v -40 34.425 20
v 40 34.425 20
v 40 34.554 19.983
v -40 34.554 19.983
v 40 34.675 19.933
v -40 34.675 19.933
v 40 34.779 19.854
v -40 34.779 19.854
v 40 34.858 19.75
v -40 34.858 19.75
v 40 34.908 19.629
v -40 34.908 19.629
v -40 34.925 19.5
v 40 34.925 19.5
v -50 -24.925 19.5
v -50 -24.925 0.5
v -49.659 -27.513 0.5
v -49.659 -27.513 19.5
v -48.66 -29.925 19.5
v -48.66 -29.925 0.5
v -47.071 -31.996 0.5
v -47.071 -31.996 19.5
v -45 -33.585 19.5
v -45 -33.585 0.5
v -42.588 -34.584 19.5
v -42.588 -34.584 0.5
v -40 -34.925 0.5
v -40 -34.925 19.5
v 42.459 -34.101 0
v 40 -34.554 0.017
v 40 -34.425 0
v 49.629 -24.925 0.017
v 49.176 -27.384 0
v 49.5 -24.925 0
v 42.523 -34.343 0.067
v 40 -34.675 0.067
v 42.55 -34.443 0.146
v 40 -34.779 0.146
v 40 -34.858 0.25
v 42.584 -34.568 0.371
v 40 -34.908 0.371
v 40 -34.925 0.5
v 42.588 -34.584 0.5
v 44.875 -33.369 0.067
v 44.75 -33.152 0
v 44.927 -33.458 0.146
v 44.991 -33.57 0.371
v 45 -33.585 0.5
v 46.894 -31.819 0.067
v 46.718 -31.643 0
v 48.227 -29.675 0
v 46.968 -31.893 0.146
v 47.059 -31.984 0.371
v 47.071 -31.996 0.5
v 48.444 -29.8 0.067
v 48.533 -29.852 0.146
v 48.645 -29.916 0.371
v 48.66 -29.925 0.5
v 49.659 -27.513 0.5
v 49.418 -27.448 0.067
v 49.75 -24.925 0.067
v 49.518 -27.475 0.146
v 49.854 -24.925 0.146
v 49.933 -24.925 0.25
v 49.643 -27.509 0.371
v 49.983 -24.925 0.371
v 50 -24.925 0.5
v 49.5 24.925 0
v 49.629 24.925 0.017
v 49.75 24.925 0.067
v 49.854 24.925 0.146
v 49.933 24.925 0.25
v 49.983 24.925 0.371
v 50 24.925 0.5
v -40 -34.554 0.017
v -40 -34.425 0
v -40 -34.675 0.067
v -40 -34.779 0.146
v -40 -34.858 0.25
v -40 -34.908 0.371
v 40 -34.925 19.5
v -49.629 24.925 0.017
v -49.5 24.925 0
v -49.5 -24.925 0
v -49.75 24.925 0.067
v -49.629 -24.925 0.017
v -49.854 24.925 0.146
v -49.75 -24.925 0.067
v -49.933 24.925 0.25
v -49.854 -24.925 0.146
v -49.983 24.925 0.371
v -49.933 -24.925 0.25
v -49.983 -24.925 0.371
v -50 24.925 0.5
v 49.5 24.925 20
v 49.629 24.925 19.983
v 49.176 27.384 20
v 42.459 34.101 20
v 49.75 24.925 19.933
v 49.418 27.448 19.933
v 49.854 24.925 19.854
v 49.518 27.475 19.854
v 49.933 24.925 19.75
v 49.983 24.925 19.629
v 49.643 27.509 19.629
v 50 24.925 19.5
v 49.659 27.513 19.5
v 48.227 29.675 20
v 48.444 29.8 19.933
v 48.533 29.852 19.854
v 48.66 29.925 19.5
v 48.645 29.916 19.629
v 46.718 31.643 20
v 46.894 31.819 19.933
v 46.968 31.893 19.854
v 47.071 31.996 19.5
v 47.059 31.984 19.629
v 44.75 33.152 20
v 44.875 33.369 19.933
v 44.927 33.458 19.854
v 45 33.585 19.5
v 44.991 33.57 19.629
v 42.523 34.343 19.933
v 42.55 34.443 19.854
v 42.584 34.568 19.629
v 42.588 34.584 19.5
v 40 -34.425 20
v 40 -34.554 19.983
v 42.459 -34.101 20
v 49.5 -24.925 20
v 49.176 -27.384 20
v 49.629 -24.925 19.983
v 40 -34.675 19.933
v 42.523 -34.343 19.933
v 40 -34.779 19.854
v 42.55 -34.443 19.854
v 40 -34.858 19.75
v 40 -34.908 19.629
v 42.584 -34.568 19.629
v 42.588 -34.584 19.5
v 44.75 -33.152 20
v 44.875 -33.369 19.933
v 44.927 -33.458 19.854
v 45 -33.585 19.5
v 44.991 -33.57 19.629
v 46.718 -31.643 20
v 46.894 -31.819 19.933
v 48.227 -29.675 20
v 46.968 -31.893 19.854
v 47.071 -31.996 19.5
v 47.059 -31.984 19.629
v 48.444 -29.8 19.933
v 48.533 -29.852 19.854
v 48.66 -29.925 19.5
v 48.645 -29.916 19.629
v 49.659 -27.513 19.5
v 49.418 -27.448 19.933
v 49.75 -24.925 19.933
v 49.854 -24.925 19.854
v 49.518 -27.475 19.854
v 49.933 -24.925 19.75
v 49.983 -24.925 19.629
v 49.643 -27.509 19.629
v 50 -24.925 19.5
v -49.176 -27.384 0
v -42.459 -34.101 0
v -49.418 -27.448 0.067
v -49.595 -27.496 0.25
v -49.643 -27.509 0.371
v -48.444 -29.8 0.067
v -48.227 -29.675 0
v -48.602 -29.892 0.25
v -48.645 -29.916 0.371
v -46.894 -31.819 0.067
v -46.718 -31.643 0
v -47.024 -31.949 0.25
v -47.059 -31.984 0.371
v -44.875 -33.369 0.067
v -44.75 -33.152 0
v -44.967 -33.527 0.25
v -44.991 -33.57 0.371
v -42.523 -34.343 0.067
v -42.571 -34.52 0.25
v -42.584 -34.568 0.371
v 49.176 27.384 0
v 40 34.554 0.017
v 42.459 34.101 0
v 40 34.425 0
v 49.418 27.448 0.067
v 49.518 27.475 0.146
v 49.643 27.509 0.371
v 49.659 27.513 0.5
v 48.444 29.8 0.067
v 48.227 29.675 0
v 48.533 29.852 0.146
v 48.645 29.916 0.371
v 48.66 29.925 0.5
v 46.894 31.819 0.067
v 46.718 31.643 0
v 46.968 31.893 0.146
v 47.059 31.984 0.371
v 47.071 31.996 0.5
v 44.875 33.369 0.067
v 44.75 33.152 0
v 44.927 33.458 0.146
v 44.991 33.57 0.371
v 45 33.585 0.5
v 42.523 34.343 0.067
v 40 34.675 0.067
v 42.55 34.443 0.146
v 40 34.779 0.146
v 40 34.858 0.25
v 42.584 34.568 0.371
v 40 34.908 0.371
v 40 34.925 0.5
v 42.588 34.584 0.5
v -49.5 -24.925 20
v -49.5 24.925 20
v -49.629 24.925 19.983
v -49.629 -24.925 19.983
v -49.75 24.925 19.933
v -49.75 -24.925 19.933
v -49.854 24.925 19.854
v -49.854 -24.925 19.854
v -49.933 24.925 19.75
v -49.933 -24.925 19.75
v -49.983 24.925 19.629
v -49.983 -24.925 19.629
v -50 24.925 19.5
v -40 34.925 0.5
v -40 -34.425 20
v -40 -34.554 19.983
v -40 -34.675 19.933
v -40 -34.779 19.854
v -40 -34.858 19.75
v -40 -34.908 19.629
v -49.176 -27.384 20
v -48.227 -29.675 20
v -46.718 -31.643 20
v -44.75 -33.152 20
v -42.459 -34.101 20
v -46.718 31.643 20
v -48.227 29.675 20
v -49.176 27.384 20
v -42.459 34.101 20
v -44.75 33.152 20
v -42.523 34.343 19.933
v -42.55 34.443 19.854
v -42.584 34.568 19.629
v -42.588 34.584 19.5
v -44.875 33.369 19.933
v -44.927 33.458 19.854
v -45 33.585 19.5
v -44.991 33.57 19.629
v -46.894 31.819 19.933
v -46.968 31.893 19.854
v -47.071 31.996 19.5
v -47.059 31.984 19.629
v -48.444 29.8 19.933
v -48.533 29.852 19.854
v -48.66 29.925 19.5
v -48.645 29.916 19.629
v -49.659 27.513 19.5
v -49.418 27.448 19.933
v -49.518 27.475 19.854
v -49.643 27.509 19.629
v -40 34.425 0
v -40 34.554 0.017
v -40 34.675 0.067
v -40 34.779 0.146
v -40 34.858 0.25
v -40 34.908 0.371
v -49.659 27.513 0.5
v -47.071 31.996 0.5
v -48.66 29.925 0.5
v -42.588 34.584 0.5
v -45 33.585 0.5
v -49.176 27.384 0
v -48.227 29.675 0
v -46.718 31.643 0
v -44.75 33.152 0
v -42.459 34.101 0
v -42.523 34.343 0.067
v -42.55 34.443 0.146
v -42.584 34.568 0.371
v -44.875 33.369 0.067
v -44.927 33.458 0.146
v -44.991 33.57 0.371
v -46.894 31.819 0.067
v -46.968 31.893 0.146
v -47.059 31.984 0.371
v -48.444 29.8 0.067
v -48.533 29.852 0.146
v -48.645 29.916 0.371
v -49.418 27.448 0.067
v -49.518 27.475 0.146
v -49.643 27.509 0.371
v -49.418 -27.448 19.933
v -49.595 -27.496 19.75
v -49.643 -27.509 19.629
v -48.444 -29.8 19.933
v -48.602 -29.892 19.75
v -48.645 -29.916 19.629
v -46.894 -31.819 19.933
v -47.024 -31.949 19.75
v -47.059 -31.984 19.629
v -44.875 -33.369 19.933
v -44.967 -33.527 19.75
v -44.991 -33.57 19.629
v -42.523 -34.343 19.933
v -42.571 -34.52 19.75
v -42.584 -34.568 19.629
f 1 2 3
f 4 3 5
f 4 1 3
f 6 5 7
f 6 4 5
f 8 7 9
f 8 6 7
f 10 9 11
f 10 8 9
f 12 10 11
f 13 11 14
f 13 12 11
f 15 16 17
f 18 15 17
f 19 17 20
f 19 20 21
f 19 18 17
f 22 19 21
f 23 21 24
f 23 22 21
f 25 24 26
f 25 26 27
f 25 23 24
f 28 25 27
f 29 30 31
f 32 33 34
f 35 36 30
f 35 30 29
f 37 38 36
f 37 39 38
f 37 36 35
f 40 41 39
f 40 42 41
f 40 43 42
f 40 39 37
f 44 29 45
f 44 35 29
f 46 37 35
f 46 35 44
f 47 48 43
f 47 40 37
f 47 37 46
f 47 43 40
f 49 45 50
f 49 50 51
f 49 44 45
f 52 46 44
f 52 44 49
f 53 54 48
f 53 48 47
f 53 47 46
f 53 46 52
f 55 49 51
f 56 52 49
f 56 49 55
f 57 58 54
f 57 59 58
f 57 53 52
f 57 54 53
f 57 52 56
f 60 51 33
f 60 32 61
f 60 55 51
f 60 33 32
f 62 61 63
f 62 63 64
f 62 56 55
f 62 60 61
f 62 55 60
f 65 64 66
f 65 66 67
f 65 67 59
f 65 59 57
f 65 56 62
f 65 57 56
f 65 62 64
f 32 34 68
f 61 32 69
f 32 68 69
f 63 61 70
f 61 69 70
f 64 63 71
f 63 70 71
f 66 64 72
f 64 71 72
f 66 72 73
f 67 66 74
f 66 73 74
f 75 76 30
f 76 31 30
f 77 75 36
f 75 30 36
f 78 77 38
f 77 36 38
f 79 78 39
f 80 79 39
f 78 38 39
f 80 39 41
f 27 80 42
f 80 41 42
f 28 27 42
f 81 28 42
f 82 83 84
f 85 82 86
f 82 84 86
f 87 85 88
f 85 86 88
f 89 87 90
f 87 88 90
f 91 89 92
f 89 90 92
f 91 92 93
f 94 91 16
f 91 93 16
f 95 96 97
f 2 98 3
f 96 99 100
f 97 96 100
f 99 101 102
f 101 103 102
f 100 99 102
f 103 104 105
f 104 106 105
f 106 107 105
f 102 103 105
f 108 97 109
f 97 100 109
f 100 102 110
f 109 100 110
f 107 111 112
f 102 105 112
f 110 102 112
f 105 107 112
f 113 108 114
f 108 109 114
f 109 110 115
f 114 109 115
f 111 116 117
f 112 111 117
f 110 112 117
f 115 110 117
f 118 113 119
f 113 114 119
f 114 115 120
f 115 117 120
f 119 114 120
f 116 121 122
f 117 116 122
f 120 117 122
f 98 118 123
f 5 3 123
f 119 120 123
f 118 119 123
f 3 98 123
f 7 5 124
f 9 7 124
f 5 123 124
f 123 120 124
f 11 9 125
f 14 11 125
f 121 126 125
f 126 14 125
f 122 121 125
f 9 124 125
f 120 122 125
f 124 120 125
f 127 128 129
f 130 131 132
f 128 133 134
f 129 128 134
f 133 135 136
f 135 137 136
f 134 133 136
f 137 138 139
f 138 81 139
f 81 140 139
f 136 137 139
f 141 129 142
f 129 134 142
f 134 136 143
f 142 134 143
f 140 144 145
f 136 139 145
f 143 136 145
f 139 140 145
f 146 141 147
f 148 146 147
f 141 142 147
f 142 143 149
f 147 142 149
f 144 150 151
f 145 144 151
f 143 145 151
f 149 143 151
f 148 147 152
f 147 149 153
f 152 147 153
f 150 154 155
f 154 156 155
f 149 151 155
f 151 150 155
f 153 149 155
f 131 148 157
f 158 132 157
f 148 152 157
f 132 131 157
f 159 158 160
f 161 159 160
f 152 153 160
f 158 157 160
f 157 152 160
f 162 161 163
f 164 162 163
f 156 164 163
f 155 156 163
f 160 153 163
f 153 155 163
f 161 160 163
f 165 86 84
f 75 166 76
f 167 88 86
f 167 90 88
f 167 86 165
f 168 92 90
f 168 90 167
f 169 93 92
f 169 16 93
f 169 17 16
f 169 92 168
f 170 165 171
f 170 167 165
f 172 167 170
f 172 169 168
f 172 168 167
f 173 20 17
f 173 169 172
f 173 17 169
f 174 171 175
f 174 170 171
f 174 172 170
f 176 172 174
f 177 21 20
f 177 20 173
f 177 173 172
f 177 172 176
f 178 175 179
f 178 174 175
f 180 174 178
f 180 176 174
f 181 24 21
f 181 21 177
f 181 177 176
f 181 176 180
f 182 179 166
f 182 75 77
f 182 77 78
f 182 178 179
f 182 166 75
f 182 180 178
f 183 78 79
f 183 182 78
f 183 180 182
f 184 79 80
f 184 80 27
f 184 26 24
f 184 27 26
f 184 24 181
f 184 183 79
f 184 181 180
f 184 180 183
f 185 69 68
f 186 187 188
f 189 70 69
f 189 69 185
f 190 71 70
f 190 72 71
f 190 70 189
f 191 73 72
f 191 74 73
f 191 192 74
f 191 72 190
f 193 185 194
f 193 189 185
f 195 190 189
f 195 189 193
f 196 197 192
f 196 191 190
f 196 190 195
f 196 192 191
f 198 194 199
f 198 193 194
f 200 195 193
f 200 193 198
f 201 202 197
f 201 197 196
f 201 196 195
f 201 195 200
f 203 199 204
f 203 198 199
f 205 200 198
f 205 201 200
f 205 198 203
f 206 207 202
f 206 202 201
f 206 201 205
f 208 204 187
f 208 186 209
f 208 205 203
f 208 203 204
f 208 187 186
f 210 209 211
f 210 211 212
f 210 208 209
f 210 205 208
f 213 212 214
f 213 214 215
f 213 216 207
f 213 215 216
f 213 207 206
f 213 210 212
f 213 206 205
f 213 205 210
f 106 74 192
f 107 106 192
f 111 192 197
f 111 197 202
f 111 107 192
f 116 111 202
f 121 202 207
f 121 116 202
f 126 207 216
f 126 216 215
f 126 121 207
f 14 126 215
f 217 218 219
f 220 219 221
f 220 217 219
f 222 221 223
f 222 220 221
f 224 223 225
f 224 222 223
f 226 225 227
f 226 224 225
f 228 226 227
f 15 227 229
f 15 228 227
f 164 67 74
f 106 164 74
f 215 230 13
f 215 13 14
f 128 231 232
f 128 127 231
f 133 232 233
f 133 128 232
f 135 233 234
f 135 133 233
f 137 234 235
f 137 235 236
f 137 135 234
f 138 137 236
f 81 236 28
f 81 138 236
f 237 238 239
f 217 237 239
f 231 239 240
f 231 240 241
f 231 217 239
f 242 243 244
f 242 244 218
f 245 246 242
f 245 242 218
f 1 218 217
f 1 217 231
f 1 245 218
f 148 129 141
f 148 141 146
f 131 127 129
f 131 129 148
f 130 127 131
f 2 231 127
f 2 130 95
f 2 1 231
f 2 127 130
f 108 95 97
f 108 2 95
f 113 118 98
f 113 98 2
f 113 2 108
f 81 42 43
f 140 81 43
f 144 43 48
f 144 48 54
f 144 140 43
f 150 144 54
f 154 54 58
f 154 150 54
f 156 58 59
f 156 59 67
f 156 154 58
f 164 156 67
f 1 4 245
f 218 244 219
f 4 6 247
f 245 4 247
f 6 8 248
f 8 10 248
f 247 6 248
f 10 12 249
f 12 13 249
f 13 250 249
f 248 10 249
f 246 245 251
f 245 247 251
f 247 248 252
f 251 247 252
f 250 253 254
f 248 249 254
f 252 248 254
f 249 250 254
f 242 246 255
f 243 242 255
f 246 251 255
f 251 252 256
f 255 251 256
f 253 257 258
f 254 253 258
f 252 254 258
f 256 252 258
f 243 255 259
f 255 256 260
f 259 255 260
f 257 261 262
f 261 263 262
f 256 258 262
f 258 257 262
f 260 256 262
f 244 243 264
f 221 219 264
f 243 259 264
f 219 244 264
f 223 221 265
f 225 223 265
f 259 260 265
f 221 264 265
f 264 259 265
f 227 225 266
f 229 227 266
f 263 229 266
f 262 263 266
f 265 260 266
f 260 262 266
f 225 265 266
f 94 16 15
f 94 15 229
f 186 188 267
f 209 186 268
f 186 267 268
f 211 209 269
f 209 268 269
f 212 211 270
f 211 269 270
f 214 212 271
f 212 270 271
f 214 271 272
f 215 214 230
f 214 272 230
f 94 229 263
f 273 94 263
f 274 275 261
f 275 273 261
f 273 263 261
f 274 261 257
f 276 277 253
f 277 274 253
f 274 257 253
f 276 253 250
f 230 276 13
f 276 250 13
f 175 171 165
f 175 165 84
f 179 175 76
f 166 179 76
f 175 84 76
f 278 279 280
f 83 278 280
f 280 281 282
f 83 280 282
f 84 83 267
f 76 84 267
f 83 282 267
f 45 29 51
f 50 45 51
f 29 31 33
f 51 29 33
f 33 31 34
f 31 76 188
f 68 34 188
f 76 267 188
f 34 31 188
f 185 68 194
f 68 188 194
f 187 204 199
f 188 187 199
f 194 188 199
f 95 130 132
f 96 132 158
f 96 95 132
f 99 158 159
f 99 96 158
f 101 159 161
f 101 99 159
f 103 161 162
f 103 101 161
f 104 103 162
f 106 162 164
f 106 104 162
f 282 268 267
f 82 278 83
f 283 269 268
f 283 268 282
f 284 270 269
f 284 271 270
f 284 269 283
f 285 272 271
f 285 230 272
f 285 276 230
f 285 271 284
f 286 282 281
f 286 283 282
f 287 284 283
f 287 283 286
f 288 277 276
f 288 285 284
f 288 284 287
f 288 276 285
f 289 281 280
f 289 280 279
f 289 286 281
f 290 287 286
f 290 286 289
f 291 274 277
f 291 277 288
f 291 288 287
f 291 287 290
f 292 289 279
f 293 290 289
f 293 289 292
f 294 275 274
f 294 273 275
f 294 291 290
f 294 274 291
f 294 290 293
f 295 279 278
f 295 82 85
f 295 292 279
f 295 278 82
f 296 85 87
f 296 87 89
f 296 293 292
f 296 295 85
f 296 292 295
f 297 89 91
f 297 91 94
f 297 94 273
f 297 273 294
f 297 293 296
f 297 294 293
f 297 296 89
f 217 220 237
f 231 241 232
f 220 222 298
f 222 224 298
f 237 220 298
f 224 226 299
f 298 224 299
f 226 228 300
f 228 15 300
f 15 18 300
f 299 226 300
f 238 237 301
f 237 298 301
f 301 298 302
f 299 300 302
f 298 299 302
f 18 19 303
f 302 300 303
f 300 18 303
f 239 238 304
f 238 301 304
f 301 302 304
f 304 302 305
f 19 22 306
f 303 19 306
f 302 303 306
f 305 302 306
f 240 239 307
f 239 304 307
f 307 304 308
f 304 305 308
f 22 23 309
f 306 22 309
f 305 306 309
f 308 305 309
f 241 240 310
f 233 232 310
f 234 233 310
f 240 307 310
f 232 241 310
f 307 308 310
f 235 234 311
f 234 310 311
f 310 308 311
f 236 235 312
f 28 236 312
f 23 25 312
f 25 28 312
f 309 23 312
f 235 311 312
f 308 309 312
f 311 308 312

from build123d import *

# Parameters (mm, degrees)
SKETCH1_W           = 100
SKETCH1_H           = 69.85
BOSS_EXTRUDE1_DEPTH = 20
FILLET1_R           = 10
FILLET2_R           = 0.5


with BuildPart() as part:
    # Sketch1 → Boss-Extrude1 (new body)
    with BuildSketch(Plane.XY):
        Rectangle(SKETCH1_W, SKETCH1_H)
    extrude(amount=BOSS_EXTRUDE1_DEPTH)

    # Fillet1
    fillet1_edges = [part.edges().sort_by_distance(p)[0] for p in [
        (50, -34.925, 10),
        (-50, -34.925, 10),
        (-50, 34.925, 10),
        (50, 34.925, 10),
    ]]
    fillet(fillet1_edges, radius=FILLET1_R)

    # Fillet2
    fillet2_edges = [part.edges().sort_by_distance(p)[0] for p in [
        (0, -34.925, 0),
        (0, -34.925, 20),
        (50, 0, 0),
        (-50, 0, 0),
        (0, 34.925, 0),
        (-47.071067812, 31.996067812, 0),
        (47.071067812, 31.996067812, 0),
        (47.071067812, -31.996067812, 0),
        (-47.071067812, -31.996067812, 0),
        (-50, 0, 20),
        (50, 0, 20),
        (0, 34.925, 20),
        (-47.071067812, 31.996067812, 20),
        (47.071067812, 31.996067812, 20),
        (47.071067812, -31.996067812, 20),
        (-47.071067812, -31.996067812, 20),
    ]]
    fillet(fillet2_edges, radius=FILLET2_R)


solid = part.part
